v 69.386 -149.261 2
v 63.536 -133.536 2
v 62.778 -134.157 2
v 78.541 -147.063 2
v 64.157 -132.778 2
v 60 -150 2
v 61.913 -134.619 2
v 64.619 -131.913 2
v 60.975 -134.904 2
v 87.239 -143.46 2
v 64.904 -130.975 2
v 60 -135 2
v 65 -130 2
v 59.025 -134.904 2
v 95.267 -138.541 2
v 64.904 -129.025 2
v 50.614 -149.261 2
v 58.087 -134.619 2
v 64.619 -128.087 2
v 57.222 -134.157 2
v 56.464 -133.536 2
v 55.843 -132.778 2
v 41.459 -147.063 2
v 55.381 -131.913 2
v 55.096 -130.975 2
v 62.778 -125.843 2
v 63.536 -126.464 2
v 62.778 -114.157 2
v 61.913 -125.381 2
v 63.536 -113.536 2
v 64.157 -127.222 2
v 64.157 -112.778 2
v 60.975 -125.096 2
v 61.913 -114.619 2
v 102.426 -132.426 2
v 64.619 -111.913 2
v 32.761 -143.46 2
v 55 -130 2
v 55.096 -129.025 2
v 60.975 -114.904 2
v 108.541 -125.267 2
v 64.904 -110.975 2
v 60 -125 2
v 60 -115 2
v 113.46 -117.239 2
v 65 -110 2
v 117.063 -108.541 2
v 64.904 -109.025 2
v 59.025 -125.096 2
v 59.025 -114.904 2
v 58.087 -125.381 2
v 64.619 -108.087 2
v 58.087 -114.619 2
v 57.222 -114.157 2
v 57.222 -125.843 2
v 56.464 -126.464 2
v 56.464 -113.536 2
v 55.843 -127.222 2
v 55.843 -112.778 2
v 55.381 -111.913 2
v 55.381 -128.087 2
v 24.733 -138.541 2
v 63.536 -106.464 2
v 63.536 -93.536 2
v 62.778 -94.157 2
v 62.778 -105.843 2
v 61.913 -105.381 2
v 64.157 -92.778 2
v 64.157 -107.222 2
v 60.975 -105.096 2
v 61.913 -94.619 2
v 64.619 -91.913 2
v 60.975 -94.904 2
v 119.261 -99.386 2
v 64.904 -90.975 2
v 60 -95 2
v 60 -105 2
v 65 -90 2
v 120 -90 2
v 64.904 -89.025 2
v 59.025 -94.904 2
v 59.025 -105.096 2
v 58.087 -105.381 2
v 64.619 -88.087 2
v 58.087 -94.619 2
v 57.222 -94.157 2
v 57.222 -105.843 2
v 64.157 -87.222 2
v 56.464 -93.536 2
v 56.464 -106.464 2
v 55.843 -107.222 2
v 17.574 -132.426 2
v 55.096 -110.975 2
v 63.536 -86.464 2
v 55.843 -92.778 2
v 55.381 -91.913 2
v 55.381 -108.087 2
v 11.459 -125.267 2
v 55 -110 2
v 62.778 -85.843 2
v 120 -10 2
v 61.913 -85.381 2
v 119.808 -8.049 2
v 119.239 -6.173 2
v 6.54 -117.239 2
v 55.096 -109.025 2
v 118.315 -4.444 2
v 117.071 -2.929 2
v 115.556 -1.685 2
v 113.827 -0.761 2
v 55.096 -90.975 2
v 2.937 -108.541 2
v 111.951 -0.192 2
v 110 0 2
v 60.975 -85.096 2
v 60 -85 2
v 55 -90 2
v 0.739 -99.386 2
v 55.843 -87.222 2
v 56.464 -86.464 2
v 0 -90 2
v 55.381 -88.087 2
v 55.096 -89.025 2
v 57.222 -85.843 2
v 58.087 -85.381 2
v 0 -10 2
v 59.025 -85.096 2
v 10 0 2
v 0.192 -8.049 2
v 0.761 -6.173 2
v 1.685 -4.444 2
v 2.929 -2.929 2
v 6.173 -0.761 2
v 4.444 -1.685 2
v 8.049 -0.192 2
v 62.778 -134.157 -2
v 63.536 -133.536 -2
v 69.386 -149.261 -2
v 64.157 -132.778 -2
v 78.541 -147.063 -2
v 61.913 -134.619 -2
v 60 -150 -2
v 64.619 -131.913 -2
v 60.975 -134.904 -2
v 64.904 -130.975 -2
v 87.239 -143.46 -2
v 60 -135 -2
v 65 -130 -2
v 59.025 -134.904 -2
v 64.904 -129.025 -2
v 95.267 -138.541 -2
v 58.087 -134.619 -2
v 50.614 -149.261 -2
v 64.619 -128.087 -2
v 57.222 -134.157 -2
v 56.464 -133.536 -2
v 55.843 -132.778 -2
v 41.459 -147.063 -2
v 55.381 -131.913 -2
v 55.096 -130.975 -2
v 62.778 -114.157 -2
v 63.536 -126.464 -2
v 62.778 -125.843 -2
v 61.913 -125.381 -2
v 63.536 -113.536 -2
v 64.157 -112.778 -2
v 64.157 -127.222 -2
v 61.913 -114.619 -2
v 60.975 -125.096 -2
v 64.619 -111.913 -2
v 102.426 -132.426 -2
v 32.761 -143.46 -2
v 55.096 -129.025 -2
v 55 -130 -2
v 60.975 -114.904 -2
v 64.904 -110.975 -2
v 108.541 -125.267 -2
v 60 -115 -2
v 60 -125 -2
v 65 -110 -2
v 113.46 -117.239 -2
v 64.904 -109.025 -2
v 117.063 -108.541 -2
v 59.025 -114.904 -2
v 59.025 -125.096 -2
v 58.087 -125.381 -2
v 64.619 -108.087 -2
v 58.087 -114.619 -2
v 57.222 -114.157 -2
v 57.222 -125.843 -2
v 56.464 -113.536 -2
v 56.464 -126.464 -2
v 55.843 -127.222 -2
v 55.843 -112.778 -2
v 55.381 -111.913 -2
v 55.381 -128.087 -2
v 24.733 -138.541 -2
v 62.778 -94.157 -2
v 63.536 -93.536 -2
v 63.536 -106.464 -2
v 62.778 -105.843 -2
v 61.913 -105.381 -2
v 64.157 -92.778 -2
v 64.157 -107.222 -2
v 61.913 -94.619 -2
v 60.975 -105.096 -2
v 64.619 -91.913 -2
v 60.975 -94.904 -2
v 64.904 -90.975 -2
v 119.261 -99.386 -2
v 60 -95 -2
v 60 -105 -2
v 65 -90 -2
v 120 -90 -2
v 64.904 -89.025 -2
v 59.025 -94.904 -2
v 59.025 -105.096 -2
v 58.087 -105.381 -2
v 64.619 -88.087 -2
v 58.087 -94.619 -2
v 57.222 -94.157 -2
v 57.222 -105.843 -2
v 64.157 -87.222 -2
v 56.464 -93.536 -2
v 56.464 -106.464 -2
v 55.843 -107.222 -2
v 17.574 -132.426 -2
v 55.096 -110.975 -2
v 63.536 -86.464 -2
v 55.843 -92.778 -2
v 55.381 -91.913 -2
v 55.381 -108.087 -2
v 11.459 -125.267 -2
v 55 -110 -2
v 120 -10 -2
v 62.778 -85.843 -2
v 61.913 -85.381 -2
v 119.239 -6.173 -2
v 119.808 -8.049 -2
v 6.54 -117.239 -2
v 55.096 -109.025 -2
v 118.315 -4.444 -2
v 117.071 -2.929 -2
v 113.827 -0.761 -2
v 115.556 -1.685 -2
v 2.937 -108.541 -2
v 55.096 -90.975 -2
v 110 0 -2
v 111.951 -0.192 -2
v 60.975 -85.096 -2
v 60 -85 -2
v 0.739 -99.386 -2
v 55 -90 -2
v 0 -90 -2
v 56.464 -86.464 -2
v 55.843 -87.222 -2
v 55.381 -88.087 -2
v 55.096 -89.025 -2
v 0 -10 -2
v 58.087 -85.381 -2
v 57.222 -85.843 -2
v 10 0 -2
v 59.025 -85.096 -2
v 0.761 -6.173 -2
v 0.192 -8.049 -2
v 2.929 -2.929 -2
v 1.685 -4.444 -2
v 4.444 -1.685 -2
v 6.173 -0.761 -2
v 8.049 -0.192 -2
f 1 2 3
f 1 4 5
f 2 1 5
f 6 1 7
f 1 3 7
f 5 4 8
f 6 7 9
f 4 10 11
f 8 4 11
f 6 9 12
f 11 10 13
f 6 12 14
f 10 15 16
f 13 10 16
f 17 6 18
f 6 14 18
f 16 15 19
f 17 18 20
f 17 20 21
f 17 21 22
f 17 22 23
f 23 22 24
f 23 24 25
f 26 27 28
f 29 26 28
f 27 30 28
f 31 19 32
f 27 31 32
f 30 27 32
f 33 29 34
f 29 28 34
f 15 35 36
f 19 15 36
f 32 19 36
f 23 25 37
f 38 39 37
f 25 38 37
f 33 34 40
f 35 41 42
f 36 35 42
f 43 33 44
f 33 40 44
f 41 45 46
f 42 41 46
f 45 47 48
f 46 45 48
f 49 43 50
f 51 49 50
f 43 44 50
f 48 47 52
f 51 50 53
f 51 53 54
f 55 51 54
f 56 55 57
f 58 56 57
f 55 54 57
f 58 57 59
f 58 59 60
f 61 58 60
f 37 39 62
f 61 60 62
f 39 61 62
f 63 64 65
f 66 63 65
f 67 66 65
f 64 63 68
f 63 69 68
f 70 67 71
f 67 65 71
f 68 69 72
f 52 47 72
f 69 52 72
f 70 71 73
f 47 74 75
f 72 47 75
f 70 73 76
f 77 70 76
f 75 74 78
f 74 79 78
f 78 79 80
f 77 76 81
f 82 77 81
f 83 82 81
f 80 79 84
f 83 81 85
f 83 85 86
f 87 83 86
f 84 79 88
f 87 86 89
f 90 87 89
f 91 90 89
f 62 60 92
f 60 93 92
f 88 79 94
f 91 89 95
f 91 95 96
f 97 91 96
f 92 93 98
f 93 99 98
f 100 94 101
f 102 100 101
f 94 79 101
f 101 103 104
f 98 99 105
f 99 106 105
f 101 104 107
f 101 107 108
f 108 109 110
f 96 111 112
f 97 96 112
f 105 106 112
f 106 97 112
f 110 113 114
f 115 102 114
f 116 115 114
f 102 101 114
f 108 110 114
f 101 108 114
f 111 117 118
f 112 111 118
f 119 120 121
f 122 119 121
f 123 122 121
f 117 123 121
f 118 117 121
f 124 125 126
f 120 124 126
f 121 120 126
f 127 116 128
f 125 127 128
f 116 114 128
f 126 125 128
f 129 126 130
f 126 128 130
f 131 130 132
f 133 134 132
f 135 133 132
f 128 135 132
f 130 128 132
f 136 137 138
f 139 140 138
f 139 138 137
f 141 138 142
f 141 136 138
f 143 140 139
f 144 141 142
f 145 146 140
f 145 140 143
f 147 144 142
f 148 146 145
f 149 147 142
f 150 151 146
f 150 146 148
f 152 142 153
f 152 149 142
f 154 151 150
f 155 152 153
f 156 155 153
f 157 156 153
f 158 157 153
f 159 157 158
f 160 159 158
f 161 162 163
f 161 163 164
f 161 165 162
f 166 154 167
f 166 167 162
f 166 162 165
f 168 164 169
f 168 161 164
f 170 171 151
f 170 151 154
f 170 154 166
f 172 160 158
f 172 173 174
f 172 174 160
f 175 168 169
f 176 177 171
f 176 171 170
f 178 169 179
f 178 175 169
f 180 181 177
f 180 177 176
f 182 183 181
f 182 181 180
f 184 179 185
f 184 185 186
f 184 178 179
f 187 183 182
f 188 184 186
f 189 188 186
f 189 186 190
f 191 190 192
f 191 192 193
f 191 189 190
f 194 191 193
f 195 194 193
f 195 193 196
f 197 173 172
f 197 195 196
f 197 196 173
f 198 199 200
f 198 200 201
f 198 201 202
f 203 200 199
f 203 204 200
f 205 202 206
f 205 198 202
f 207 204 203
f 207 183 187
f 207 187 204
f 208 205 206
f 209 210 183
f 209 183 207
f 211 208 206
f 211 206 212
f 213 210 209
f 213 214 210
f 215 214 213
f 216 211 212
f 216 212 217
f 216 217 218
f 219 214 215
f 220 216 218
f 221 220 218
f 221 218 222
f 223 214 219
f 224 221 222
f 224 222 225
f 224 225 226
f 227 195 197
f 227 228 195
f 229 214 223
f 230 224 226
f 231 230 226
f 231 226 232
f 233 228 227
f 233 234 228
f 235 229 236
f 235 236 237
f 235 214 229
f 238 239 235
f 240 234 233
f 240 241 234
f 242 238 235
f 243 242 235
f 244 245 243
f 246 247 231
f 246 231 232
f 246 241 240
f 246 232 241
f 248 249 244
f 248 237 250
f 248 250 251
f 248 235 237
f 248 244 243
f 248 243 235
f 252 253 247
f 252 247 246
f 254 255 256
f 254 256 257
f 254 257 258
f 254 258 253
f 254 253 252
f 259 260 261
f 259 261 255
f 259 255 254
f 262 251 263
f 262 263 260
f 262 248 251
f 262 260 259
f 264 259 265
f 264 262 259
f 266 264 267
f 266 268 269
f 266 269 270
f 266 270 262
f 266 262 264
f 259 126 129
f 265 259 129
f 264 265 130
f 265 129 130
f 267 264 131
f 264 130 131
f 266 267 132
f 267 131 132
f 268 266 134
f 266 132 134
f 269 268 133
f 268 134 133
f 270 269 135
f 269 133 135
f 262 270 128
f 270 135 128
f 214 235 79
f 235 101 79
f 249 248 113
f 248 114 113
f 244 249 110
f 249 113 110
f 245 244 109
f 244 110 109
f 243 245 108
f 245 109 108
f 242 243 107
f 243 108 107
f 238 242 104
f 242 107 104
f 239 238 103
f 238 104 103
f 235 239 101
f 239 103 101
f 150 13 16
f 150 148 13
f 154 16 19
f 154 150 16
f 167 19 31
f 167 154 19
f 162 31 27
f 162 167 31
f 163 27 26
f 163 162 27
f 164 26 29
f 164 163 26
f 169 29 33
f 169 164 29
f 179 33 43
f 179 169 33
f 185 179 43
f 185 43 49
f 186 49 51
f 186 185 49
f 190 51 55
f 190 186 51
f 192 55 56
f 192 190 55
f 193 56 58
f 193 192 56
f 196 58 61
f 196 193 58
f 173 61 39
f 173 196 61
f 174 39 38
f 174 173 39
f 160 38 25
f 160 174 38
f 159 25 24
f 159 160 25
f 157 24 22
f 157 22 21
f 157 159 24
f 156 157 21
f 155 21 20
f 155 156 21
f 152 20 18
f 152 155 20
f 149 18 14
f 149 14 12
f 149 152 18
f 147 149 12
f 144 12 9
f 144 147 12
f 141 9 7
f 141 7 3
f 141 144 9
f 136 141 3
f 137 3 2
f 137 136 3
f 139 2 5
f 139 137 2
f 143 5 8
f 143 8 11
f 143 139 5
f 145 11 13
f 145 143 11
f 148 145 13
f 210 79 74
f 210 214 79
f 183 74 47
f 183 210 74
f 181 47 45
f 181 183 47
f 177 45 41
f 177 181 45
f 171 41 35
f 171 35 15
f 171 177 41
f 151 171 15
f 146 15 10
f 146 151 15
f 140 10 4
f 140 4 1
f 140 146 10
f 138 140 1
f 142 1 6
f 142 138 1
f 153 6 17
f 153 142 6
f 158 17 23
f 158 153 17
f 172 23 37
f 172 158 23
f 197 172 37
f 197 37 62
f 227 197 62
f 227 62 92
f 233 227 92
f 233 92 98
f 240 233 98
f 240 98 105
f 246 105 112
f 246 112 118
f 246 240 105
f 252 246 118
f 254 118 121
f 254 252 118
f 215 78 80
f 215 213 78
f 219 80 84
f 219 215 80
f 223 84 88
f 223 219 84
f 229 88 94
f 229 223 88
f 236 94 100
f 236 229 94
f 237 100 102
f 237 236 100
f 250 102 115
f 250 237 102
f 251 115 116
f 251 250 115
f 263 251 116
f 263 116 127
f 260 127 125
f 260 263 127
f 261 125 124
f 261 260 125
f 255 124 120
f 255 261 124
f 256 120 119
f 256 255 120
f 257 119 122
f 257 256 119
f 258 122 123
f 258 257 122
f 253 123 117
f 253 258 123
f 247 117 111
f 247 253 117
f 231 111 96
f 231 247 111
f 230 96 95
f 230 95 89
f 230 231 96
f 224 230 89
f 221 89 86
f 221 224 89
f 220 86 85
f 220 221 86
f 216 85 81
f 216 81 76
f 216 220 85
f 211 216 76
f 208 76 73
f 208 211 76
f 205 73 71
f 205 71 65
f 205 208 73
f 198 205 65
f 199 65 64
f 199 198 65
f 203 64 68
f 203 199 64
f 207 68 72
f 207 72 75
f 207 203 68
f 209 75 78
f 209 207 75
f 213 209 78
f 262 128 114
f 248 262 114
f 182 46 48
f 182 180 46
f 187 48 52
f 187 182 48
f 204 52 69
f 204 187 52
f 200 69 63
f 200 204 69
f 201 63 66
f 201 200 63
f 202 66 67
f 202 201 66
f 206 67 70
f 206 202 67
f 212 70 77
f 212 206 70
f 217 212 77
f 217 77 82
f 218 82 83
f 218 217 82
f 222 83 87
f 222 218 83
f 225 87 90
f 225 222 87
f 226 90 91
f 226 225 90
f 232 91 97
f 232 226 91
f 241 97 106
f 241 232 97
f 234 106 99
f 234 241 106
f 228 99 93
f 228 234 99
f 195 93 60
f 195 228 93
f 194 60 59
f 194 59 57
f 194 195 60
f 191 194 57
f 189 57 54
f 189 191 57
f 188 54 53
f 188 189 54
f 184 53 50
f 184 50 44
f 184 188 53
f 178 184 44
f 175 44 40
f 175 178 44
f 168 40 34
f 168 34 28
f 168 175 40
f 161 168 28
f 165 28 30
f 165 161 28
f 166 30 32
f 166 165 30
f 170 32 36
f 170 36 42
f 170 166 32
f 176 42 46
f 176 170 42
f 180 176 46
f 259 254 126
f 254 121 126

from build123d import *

# Parameters (mm, degrees)
SKETCH_1_R      = 5
EXTRUDE_1_DEPTH = 2


with BuildPart() as part:
    # 草图1 → 凸台-拉伸1 (new, symmetric)
    with BuildSketch(Plane.XY):
        with BuildLine():
            Line((10, 0), (110, 0))
            ThreePointArc((110, 0), (117.071067812, -2.928932188), (120, -10))
            Line((120, -10), (120, -90))
            ThreePointArc((120, -90), (102.426406871, -132.426406871), (60, -150))
            ThreePointArc((60, -150), (17.573593129, -132.426406871), (0, -90))
            Line((0, -90), (0, -10))
            ThreePointArc((0, -10), (2.928932188, -2.928932188), (10, 0))
        make_face()
        with Locations((60, -130)):
            Circle(SKETCH_1_R, mode=Mode.SUBTRACT)
        with Locations((60, -110)):
            Circle(SKETCH_1_R, mode=Mode.SUBTRACT)
        with Locations((60, -90)):
            Circle(SKETCH_1_R, mode=Mode.SUBTRACT)
    extrude(amount=EXTRUDE_1_DEPTH, both=True)


solid = part.part
